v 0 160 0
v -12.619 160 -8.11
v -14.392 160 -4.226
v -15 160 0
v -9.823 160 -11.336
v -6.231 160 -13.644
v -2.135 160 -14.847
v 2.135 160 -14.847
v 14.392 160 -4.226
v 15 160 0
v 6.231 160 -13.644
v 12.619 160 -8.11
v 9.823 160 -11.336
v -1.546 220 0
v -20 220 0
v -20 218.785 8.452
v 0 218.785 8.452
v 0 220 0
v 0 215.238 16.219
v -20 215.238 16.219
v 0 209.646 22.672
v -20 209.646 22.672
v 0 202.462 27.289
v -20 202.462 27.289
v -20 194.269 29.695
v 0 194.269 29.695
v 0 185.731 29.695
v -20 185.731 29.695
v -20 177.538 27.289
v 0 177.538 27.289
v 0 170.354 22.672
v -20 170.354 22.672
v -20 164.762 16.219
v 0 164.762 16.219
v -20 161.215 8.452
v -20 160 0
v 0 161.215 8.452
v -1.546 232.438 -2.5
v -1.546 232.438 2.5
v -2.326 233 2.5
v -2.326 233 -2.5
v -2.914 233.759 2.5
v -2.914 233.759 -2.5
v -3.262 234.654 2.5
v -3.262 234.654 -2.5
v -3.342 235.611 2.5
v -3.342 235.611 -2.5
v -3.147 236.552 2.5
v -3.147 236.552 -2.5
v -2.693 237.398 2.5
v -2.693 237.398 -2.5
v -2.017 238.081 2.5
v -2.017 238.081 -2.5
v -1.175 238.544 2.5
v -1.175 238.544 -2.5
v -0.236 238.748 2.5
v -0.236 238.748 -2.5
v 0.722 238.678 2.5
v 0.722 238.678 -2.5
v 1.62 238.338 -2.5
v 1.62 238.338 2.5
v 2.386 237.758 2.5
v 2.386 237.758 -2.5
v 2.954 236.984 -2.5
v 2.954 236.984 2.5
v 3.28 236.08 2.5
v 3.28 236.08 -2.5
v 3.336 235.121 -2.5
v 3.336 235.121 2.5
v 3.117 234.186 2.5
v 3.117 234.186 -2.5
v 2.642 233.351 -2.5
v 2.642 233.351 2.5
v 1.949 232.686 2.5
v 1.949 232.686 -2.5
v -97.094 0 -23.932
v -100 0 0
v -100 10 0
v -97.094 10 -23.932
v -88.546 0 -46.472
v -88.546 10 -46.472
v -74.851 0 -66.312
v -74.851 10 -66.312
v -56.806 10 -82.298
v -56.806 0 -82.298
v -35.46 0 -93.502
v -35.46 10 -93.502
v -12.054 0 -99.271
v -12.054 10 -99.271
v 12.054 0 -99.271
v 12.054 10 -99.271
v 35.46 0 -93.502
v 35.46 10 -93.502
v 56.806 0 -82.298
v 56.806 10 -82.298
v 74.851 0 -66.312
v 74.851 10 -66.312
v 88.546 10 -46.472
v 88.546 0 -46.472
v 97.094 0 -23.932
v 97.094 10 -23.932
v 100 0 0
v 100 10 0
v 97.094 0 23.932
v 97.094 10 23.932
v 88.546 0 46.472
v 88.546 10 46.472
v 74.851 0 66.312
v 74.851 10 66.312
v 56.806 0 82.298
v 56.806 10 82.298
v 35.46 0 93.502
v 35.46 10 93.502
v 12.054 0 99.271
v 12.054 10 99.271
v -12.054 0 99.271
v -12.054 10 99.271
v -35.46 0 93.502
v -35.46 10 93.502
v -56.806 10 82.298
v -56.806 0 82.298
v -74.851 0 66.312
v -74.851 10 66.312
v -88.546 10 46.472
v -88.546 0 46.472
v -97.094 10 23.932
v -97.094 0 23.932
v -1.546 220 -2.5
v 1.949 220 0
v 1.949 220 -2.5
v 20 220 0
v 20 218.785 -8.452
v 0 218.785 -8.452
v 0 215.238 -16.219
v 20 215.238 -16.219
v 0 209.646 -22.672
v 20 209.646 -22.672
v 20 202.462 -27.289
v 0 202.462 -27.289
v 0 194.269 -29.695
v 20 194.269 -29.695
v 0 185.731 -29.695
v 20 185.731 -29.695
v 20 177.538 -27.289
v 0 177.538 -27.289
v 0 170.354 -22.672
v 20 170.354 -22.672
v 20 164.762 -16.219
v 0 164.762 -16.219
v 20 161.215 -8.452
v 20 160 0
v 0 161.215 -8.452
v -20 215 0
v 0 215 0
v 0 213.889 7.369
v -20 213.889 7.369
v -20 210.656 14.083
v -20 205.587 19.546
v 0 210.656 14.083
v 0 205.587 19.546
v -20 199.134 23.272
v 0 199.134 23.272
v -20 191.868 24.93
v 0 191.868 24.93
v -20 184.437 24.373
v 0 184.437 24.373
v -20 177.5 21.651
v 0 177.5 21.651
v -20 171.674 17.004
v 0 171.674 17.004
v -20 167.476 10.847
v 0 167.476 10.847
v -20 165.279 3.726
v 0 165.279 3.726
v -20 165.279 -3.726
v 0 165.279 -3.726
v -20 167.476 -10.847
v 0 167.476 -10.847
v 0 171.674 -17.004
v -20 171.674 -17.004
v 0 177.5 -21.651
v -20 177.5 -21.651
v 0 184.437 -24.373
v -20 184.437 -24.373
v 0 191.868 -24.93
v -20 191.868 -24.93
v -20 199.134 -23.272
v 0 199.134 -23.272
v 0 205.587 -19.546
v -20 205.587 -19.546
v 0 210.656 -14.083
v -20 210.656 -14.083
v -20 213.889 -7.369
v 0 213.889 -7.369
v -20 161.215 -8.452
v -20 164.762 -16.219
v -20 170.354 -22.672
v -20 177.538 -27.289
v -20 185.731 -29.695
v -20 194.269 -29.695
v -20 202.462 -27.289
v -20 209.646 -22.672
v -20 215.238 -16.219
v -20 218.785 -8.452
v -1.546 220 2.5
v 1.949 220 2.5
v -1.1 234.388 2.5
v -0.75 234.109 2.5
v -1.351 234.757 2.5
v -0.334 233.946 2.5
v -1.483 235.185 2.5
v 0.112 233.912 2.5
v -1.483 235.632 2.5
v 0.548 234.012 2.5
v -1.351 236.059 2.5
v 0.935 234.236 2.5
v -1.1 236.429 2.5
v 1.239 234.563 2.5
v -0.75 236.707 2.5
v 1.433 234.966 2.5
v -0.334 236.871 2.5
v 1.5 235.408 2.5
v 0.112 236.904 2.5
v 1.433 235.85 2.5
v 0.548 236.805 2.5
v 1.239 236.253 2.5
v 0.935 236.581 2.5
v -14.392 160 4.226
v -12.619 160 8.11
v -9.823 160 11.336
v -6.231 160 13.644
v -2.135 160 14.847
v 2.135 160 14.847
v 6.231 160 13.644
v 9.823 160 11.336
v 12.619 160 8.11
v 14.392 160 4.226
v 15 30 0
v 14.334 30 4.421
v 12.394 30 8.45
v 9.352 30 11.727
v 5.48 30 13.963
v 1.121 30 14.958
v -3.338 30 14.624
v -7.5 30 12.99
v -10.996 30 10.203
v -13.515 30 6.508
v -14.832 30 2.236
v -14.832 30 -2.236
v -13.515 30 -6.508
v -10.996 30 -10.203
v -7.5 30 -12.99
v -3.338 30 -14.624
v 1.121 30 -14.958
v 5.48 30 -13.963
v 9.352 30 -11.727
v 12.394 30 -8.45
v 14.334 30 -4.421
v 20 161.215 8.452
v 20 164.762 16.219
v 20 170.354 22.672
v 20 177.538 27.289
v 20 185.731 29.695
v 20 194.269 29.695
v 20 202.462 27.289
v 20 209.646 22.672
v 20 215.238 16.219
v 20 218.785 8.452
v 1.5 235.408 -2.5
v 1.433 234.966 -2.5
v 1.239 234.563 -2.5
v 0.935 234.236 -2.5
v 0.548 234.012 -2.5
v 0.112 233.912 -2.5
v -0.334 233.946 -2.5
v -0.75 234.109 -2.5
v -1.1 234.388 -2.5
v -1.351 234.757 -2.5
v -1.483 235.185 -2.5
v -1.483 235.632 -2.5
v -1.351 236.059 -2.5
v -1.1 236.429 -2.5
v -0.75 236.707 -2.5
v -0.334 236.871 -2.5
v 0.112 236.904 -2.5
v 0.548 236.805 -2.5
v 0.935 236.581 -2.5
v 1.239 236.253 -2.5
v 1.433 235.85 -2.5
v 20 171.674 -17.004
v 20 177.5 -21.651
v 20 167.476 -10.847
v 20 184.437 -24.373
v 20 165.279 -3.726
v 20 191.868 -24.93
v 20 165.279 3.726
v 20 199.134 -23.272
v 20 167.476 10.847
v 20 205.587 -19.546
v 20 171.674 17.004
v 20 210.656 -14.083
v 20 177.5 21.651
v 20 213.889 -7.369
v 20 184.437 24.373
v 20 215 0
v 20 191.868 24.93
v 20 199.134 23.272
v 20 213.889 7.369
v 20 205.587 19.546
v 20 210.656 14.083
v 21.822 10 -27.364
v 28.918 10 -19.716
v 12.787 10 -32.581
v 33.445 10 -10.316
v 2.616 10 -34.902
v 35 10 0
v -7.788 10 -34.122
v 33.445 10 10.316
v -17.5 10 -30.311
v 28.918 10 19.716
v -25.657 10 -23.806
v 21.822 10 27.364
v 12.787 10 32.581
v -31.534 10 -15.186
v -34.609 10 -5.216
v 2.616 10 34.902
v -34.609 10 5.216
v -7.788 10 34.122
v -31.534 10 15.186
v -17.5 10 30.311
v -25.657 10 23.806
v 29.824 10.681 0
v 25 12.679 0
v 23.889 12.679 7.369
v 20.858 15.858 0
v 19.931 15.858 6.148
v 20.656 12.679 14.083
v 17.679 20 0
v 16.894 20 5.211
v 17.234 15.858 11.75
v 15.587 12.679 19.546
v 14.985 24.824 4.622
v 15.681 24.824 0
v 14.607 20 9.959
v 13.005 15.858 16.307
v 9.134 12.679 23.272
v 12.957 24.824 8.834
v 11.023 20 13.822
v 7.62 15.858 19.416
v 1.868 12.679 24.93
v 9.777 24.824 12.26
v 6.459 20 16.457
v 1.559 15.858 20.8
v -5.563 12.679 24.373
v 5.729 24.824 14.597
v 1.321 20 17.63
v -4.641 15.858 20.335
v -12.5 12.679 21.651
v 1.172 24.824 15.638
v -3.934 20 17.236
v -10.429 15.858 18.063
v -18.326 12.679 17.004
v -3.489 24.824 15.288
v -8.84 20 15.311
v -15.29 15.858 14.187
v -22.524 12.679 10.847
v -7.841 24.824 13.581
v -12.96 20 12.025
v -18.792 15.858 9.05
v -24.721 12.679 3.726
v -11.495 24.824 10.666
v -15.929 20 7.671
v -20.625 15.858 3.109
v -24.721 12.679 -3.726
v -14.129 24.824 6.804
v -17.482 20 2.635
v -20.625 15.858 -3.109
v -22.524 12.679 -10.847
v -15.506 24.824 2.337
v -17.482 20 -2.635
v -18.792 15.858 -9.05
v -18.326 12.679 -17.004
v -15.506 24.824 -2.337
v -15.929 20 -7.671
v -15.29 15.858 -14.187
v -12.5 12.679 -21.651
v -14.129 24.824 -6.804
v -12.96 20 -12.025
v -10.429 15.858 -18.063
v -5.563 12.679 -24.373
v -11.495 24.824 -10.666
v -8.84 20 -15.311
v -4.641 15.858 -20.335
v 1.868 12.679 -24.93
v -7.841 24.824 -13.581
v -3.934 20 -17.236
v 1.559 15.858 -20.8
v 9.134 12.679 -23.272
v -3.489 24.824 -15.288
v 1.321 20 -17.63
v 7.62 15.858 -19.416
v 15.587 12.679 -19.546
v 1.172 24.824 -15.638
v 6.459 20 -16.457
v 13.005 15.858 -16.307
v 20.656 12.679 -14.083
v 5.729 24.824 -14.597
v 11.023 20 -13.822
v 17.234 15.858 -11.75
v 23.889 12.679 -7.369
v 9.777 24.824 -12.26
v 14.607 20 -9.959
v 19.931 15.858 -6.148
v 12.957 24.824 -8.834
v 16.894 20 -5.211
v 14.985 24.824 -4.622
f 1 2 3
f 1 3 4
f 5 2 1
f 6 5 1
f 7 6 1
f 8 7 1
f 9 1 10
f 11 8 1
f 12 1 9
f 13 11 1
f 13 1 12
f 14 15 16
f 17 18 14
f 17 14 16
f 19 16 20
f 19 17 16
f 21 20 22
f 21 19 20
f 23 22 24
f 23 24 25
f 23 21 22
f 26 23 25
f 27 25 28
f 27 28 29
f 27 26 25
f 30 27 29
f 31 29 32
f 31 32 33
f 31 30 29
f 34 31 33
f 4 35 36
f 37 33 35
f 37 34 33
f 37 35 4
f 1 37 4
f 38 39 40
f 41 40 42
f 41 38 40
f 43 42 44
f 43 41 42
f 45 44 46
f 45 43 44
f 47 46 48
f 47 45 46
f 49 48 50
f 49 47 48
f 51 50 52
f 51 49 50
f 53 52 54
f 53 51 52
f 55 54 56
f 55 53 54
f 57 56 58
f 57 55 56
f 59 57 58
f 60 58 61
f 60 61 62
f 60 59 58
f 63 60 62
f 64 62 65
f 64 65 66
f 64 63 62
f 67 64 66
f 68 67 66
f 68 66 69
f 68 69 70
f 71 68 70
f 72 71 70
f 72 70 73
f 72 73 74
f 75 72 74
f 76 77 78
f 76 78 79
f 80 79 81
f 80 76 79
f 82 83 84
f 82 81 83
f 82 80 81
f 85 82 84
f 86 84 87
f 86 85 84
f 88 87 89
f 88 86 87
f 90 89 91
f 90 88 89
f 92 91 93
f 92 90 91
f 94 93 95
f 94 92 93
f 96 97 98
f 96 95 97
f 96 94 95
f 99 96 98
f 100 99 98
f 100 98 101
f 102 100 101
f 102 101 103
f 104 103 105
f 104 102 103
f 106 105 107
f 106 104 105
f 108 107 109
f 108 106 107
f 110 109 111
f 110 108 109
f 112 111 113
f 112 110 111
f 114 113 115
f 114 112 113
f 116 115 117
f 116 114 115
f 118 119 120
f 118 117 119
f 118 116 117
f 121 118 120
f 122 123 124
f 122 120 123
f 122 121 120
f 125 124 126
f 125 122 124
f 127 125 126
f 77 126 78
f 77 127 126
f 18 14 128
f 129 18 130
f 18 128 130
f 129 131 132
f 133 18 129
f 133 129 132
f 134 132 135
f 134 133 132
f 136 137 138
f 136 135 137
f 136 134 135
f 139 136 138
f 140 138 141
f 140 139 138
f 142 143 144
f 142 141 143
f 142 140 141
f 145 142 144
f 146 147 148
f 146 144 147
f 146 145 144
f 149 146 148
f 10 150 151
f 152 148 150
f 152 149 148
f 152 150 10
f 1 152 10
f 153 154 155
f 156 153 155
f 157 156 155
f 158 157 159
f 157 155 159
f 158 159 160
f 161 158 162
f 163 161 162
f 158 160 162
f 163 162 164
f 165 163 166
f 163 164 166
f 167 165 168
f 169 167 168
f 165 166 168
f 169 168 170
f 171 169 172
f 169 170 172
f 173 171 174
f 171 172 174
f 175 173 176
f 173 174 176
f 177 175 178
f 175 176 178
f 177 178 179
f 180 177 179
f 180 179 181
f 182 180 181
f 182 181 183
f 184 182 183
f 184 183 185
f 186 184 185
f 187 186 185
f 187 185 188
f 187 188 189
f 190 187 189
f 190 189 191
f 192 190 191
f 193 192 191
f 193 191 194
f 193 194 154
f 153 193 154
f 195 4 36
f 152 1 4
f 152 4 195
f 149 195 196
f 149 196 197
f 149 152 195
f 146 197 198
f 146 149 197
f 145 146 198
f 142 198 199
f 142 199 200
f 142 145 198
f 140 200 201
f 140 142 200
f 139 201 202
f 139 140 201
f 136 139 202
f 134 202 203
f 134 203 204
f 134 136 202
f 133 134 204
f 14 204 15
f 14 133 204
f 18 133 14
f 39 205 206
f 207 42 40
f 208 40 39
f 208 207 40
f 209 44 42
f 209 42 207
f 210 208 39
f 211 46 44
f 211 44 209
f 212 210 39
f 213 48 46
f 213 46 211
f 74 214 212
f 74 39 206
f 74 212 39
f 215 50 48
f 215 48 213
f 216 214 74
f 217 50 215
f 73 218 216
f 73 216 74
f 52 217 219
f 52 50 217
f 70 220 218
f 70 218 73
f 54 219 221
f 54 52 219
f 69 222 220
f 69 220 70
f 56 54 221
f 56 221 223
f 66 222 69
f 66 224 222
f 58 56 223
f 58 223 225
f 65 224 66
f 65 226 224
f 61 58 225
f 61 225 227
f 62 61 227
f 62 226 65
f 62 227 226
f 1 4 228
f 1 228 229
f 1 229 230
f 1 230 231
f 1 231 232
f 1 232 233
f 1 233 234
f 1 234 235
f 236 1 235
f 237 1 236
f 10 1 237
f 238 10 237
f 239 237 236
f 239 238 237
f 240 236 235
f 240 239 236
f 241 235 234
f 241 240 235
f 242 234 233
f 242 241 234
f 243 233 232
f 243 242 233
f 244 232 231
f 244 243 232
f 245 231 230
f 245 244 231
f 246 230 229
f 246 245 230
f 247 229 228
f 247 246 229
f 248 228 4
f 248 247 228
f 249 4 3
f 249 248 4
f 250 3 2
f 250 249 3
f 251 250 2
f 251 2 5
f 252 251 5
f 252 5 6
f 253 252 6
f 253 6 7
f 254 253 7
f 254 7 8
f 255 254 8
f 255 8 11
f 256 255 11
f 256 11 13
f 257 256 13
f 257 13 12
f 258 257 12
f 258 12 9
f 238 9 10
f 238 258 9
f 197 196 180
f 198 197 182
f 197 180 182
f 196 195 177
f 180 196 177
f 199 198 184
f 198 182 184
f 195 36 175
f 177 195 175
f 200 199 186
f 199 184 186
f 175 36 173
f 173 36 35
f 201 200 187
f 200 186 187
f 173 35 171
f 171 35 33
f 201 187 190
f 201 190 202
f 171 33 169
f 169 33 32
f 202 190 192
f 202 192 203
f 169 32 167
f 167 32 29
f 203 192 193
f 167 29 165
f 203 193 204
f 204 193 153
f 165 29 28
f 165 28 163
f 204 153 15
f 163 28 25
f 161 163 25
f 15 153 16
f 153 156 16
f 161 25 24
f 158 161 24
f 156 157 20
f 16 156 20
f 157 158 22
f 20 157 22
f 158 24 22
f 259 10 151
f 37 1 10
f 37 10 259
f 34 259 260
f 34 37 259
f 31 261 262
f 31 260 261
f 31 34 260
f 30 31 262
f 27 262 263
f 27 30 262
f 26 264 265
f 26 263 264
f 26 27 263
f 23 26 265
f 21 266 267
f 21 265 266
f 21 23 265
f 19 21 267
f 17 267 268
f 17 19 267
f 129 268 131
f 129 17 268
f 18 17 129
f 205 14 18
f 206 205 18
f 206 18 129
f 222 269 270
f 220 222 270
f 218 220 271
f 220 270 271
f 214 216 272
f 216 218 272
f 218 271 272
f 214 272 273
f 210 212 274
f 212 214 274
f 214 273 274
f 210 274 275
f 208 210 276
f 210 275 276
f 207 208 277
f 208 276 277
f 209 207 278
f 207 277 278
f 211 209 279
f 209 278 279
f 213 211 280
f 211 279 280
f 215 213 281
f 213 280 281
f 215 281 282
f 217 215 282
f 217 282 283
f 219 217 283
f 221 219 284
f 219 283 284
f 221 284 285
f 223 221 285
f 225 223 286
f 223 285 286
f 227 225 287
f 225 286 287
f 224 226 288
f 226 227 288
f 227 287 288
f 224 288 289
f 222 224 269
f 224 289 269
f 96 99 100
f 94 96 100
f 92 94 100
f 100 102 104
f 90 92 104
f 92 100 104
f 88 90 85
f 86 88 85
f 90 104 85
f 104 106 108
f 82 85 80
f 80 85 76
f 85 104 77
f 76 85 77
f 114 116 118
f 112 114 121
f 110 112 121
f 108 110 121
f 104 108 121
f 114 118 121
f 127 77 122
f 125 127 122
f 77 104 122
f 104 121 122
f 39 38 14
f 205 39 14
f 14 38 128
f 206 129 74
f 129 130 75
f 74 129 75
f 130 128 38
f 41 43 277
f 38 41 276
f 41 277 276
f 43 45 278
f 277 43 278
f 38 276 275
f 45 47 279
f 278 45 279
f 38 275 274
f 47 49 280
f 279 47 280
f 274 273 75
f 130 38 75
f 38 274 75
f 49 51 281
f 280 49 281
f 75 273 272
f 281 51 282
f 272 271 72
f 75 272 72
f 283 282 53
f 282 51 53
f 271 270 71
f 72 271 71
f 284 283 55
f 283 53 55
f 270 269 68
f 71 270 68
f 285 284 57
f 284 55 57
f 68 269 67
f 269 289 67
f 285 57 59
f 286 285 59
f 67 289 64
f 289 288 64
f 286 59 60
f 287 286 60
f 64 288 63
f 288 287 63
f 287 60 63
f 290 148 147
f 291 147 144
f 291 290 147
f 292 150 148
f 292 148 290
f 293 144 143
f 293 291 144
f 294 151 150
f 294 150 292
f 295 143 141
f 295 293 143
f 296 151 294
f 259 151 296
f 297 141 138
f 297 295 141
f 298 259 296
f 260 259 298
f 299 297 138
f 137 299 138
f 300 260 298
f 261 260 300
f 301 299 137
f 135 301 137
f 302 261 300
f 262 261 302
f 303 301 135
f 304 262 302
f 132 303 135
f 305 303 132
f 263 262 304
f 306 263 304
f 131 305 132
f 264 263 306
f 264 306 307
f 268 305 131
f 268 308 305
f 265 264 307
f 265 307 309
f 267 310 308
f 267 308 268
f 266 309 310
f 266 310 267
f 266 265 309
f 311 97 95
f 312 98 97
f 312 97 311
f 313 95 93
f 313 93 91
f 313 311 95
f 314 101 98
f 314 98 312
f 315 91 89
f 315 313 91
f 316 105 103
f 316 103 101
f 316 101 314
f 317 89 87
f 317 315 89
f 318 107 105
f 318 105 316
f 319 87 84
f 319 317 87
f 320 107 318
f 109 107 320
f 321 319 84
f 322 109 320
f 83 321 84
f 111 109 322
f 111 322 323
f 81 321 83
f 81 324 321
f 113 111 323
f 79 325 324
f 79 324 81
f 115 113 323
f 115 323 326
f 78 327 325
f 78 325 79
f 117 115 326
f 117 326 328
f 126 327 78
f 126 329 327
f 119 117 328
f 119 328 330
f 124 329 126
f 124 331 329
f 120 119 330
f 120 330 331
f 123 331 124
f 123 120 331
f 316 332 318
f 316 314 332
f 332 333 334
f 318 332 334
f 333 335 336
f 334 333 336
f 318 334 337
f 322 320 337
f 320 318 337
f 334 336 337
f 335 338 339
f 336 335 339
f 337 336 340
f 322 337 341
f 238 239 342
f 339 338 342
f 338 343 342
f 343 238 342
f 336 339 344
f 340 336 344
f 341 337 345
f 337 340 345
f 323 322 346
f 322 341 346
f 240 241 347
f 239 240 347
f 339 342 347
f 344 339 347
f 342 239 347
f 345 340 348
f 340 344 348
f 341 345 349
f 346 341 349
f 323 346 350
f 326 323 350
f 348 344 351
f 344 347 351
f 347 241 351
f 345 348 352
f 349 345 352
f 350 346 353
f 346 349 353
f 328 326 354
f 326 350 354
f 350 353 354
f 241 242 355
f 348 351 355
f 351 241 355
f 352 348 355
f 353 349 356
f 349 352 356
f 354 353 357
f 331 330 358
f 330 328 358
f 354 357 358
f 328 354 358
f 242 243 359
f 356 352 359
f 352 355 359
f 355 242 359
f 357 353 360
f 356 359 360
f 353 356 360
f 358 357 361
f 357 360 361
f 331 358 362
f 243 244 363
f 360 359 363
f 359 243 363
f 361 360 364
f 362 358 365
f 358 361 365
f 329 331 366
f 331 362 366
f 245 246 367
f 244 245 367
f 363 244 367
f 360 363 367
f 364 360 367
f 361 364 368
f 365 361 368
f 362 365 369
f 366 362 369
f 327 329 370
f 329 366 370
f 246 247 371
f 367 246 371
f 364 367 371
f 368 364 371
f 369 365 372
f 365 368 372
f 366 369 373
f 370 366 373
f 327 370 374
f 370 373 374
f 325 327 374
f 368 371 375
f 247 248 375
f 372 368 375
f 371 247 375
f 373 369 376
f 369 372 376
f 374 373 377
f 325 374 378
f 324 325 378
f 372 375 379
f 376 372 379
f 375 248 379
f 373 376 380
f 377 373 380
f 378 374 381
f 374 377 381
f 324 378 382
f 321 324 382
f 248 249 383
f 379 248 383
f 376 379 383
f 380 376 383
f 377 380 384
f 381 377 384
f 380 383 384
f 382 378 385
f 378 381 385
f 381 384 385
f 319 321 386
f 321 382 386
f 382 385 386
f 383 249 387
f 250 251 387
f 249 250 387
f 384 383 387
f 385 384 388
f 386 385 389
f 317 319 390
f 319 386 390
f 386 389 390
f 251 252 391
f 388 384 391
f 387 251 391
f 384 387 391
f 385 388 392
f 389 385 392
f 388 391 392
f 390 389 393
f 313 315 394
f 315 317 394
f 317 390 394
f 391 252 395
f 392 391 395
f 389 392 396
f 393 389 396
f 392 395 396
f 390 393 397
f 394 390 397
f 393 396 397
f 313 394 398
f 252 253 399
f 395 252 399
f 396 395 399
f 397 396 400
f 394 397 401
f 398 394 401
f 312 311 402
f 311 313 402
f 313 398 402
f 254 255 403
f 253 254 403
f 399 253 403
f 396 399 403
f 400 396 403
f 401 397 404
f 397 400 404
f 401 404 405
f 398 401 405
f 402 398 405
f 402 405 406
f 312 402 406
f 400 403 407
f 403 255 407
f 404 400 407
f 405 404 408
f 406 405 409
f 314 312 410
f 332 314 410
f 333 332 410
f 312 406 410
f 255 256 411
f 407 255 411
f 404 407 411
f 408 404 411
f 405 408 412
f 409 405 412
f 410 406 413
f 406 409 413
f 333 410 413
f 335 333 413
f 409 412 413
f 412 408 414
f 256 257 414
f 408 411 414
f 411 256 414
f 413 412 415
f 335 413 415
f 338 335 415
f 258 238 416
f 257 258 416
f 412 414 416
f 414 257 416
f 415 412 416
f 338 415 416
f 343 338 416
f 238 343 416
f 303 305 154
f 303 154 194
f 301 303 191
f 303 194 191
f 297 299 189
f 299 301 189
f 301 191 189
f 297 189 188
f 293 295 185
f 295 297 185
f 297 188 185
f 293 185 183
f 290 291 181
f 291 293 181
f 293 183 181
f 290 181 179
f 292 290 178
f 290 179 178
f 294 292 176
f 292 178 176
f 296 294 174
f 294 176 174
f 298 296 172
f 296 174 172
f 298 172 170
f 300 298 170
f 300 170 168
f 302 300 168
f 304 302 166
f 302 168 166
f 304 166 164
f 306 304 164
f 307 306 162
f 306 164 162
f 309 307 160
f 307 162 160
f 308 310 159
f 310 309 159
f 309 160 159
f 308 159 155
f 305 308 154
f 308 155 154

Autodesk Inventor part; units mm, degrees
ref_plane "YZ Plane" through (0, 0, 0) normal (1, 0, 0) x (0, 1, 0)
ref_plane "XZ Plane" through (0, 0, 0) normal (0, 1, 0) x (-1, 0, 0)
ref_plane "XY Plane" through (0, 0, 0) normal (0, 0, 1) x (1, 0, 0)
sketch "Sketch1" plane through (0, 0, 0) normal (0, 1, 0) x (-1, 0, 0)
  circle A0 centre (0, 0) radius 100
  dimension "d0" = 200
extrude "Extrusion1" add sketch "Sketch1" along normal blind 10
sketch "Sketch2" plane through (0, 10, 0) normal (0, 1, 0) x (1, 0, 0)
  circle A0 centre (0, 0) radius 15
  dimension "d5" = 30
extrude "Extrusion2" add sketch "Sketch2" along normal blind 150
fillet "Fillet1" radius 20 1 edges at (-15, 10, 0)
sketch "Sketch3" plane through (0, 0, 0) normal (1, 0, 0) x (0, 1, 0)
  circle A0 centre (190, 0) radius 30
  line L0 (160, -15) -> (160, 15) projected
  circle A1 centre (190, 0) radius 25
  point P0 (0, 0)
  dimension "d7" = 50
  dimension "d8" = 60
extrude "Extrusion3" add sketch "Sketch3" along normal mid plane 40
sketch "Sketch4" plane through (0, 0, 0) normal (0, 0, 1) x (1, 0, 0)
  line L0 (-20, 220) -> (20, 220) projected
  line L1 (-1.546, 220) -> (1.9488, 220)
  line L2 (1.9488, 220) -> (1.9488, 232.6856)
  line L3 (-1.546, 232.4383) -> (-1.546, 220)
  circle A0 centre (0, 235.4083) radius 3.3482
  circle A1 centre (0, 235.4083) radius 1.5
  point P0 (0, 0)
  dimension "d11" = 3
extrude "Extrusion4" add sketch "Sketch4" along normal mid plane 5
properties part number "Feet"
